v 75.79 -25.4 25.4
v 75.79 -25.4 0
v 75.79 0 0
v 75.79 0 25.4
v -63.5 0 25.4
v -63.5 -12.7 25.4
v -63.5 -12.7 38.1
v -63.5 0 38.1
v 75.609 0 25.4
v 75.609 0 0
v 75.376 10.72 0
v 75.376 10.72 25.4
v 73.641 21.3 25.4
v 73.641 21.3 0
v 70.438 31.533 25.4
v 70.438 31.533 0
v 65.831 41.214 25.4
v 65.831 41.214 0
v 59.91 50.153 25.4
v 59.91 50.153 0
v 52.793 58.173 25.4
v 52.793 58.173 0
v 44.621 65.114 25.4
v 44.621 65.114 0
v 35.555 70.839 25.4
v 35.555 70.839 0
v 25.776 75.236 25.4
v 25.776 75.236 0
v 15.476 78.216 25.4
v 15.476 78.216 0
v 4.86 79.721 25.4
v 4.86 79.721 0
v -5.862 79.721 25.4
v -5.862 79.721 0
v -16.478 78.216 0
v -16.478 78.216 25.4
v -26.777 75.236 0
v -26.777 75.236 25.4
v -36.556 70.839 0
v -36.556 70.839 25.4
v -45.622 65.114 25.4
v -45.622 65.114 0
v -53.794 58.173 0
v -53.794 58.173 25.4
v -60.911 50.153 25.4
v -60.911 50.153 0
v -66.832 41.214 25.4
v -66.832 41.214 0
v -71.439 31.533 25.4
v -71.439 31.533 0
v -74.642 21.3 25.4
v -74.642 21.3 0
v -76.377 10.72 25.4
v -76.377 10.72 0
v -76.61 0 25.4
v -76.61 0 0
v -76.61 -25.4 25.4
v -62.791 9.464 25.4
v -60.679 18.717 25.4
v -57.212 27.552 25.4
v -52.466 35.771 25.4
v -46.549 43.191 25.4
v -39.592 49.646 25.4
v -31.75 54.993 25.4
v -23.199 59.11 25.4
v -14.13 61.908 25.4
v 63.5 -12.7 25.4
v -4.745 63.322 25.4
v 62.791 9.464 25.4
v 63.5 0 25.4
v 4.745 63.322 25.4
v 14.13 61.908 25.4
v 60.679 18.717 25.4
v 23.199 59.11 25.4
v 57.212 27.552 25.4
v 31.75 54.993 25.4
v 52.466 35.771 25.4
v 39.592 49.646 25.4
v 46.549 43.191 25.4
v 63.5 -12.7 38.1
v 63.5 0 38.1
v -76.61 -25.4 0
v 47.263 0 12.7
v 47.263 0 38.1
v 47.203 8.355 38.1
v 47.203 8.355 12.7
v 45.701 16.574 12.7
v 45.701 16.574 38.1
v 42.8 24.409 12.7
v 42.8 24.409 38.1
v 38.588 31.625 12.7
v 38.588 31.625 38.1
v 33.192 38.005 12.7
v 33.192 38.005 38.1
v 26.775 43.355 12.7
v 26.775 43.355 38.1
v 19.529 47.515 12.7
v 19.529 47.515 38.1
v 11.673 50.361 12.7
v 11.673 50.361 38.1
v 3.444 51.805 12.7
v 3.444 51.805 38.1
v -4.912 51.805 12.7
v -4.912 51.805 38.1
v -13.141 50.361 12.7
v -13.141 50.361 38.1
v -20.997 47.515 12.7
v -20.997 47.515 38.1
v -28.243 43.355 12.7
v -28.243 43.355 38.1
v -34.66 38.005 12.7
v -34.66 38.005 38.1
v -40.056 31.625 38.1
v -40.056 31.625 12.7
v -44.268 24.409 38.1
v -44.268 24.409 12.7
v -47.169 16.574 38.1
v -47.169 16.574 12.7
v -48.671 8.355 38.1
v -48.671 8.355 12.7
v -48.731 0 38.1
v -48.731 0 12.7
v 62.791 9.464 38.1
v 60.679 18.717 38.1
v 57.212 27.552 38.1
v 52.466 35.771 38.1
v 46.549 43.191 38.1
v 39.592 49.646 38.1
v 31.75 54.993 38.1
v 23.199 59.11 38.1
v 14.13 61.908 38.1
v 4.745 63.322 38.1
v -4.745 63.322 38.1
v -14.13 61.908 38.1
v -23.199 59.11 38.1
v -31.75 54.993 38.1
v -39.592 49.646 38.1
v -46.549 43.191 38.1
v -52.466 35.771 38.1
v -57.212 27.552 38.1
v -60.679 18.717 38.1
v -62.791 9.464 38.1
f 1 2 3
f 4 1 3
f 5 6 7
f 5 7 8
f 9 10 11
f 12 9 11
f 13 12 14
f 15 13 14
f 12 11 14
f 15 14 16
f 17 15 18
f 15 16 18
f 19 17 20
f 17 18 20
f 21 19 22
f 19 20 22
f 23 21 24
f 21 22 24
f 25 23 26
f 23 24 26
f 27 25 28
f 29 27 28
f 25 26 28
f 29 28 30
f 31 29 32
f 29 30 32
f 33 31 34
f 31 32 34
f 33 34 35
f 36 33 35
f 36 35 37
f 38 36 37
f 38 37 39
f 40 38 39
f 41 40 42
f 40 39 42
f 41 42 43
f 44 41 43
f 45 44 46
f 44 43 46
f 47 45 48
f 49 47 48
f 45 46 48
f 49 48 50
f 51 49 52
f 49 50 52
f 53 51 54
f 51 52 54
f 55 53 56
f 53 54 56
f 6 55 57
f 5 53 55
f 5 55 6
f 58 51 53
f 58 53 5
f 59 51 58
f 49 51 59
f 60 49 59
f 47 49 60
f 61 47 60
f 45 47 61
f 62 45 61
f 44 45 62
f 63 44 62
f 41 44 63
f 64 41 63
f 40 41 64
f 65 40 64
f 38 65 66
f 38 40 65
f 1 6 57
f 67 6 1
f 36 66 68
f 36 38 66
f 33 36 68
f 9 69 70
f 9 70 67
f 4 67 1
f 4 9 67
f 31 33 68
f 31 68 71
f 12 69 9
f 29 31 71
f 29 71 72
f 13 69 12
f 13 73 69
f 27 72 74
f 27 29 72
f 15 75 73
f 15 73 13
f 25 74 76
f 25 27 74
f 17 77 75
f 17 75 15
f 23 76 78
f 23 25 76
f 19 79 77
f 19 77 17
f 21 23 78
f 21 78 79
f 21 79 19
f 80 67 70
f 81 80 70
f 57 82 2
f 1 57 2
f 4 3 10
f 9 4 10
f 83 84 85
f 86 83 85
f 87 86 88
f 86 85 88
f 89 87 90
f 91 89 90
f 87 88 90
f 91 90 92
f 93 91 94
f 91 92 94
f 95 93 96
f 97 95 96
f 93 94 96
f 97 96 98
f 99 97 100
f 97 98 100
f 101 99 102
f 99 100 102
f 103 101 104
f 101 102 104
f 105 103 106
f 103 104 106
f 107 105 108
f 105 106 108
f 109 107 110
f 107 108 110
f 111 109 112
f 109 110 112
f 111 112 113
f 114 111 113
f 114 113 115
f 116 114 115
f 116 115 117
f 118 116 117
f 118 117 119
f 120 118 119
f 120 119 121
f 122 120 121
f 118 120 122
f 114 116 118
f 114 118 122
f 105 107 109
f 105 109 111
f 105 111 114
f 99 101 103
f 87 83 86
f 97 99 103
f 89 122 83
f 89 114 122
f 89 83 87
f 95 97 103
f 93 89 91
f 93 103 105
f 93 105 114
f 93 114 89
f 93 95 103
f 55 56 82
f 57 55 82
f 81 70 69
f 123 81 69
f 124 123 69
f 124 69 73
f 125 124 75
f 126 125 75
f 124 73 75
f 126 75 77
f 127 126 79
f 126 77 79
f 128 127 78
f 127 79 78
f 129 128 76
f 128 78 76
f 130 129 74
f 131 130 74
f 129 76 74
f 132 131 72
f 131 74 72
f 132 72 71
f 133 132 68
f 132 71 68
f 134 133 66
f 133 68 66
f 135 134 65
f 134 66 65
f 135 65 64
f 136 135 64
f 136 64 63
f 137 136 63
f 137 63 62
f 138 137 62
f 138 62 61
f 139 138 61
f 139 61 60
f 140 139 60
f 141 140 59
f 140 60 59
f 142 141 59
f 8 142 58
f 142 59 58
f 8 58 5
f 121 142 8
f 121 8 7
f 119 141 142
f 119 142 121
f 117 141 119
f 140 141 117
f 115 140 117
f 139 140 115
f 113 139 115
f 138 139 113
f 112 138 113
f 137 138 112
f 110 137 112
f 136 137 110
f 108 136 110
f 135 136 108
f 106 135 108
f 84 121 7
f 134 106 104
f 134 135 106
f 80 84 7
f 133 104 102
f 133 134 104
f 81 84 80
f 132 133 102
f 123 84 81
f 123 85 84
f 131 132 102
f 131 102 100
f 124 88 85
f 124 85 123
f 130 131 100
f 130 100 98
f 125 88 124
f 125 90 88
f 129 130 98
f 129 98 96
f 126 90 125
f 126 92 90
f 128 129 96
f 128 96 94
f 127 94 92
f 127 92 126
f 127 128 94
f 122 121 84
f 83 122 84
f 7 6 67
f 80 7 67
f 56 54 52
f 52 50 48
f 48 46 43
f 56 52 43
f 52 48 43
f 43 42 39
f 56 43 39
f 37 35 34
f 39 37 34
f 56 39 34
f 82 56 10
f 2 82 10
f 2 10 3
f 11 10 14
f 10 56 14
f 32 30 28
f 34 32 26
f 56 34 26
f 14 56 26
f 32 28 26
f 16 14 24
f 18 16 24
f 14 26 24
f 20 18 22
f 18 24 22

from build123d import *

# Parameters (mm, degrees)
F1_DEPTH = 25.4
F2_W     = 127
F2_H     = 12.7
F3_DEPTH = 12.7
F5_DEPTH = 25.4


with BuildPart() as f1:
    # F0 (on Top) → F1 (new body)
    with BuildSketch(Plane.XY):
        with BuildLine():
            Line((-76.610234, 0), (75.609069, 0))
            ThreePointArc((75.609069, 0), (-0.500583, 79.90958), (-76.610234, 0))
        make_face()
        Polygon((75.789766, 0), (75.609069, 0), (-76.610234, 0), (-76.610234, -25.4), (75.789766, -25.4), align=None)
    extrude(amount=F1_DEPTH)

    # F2 (on face) → F3 (join)
    with BuildSketch(Plane.XY.offset(25.4)):
        with BuildLine():
            Line((-63.5, 0), (63.5, 0))
            ThreePointArc((63.5, 0), (0, 63.5), (-63.5, 0))
        make_face()
        with Locations((0, -6.35)):
            Rectangle(F2_W, F2_H)
    extrude(amount=F3_DEPTH)

    # F4 (on face) → F5 (cut)
    with BuildSketch(Plane.XY.offset(38.1)):
        with BuildLine():
            Line((-48.730817, 0), (47.262773, 0))
            ThreePointArc((47.262773, 0), (-0.734022, 51.986661), (-48.730817, 0))
        make_face()
    extrude(amount=-F5_DEPTH, mode=Mode.SUBTRACT)


solid = f1.part
